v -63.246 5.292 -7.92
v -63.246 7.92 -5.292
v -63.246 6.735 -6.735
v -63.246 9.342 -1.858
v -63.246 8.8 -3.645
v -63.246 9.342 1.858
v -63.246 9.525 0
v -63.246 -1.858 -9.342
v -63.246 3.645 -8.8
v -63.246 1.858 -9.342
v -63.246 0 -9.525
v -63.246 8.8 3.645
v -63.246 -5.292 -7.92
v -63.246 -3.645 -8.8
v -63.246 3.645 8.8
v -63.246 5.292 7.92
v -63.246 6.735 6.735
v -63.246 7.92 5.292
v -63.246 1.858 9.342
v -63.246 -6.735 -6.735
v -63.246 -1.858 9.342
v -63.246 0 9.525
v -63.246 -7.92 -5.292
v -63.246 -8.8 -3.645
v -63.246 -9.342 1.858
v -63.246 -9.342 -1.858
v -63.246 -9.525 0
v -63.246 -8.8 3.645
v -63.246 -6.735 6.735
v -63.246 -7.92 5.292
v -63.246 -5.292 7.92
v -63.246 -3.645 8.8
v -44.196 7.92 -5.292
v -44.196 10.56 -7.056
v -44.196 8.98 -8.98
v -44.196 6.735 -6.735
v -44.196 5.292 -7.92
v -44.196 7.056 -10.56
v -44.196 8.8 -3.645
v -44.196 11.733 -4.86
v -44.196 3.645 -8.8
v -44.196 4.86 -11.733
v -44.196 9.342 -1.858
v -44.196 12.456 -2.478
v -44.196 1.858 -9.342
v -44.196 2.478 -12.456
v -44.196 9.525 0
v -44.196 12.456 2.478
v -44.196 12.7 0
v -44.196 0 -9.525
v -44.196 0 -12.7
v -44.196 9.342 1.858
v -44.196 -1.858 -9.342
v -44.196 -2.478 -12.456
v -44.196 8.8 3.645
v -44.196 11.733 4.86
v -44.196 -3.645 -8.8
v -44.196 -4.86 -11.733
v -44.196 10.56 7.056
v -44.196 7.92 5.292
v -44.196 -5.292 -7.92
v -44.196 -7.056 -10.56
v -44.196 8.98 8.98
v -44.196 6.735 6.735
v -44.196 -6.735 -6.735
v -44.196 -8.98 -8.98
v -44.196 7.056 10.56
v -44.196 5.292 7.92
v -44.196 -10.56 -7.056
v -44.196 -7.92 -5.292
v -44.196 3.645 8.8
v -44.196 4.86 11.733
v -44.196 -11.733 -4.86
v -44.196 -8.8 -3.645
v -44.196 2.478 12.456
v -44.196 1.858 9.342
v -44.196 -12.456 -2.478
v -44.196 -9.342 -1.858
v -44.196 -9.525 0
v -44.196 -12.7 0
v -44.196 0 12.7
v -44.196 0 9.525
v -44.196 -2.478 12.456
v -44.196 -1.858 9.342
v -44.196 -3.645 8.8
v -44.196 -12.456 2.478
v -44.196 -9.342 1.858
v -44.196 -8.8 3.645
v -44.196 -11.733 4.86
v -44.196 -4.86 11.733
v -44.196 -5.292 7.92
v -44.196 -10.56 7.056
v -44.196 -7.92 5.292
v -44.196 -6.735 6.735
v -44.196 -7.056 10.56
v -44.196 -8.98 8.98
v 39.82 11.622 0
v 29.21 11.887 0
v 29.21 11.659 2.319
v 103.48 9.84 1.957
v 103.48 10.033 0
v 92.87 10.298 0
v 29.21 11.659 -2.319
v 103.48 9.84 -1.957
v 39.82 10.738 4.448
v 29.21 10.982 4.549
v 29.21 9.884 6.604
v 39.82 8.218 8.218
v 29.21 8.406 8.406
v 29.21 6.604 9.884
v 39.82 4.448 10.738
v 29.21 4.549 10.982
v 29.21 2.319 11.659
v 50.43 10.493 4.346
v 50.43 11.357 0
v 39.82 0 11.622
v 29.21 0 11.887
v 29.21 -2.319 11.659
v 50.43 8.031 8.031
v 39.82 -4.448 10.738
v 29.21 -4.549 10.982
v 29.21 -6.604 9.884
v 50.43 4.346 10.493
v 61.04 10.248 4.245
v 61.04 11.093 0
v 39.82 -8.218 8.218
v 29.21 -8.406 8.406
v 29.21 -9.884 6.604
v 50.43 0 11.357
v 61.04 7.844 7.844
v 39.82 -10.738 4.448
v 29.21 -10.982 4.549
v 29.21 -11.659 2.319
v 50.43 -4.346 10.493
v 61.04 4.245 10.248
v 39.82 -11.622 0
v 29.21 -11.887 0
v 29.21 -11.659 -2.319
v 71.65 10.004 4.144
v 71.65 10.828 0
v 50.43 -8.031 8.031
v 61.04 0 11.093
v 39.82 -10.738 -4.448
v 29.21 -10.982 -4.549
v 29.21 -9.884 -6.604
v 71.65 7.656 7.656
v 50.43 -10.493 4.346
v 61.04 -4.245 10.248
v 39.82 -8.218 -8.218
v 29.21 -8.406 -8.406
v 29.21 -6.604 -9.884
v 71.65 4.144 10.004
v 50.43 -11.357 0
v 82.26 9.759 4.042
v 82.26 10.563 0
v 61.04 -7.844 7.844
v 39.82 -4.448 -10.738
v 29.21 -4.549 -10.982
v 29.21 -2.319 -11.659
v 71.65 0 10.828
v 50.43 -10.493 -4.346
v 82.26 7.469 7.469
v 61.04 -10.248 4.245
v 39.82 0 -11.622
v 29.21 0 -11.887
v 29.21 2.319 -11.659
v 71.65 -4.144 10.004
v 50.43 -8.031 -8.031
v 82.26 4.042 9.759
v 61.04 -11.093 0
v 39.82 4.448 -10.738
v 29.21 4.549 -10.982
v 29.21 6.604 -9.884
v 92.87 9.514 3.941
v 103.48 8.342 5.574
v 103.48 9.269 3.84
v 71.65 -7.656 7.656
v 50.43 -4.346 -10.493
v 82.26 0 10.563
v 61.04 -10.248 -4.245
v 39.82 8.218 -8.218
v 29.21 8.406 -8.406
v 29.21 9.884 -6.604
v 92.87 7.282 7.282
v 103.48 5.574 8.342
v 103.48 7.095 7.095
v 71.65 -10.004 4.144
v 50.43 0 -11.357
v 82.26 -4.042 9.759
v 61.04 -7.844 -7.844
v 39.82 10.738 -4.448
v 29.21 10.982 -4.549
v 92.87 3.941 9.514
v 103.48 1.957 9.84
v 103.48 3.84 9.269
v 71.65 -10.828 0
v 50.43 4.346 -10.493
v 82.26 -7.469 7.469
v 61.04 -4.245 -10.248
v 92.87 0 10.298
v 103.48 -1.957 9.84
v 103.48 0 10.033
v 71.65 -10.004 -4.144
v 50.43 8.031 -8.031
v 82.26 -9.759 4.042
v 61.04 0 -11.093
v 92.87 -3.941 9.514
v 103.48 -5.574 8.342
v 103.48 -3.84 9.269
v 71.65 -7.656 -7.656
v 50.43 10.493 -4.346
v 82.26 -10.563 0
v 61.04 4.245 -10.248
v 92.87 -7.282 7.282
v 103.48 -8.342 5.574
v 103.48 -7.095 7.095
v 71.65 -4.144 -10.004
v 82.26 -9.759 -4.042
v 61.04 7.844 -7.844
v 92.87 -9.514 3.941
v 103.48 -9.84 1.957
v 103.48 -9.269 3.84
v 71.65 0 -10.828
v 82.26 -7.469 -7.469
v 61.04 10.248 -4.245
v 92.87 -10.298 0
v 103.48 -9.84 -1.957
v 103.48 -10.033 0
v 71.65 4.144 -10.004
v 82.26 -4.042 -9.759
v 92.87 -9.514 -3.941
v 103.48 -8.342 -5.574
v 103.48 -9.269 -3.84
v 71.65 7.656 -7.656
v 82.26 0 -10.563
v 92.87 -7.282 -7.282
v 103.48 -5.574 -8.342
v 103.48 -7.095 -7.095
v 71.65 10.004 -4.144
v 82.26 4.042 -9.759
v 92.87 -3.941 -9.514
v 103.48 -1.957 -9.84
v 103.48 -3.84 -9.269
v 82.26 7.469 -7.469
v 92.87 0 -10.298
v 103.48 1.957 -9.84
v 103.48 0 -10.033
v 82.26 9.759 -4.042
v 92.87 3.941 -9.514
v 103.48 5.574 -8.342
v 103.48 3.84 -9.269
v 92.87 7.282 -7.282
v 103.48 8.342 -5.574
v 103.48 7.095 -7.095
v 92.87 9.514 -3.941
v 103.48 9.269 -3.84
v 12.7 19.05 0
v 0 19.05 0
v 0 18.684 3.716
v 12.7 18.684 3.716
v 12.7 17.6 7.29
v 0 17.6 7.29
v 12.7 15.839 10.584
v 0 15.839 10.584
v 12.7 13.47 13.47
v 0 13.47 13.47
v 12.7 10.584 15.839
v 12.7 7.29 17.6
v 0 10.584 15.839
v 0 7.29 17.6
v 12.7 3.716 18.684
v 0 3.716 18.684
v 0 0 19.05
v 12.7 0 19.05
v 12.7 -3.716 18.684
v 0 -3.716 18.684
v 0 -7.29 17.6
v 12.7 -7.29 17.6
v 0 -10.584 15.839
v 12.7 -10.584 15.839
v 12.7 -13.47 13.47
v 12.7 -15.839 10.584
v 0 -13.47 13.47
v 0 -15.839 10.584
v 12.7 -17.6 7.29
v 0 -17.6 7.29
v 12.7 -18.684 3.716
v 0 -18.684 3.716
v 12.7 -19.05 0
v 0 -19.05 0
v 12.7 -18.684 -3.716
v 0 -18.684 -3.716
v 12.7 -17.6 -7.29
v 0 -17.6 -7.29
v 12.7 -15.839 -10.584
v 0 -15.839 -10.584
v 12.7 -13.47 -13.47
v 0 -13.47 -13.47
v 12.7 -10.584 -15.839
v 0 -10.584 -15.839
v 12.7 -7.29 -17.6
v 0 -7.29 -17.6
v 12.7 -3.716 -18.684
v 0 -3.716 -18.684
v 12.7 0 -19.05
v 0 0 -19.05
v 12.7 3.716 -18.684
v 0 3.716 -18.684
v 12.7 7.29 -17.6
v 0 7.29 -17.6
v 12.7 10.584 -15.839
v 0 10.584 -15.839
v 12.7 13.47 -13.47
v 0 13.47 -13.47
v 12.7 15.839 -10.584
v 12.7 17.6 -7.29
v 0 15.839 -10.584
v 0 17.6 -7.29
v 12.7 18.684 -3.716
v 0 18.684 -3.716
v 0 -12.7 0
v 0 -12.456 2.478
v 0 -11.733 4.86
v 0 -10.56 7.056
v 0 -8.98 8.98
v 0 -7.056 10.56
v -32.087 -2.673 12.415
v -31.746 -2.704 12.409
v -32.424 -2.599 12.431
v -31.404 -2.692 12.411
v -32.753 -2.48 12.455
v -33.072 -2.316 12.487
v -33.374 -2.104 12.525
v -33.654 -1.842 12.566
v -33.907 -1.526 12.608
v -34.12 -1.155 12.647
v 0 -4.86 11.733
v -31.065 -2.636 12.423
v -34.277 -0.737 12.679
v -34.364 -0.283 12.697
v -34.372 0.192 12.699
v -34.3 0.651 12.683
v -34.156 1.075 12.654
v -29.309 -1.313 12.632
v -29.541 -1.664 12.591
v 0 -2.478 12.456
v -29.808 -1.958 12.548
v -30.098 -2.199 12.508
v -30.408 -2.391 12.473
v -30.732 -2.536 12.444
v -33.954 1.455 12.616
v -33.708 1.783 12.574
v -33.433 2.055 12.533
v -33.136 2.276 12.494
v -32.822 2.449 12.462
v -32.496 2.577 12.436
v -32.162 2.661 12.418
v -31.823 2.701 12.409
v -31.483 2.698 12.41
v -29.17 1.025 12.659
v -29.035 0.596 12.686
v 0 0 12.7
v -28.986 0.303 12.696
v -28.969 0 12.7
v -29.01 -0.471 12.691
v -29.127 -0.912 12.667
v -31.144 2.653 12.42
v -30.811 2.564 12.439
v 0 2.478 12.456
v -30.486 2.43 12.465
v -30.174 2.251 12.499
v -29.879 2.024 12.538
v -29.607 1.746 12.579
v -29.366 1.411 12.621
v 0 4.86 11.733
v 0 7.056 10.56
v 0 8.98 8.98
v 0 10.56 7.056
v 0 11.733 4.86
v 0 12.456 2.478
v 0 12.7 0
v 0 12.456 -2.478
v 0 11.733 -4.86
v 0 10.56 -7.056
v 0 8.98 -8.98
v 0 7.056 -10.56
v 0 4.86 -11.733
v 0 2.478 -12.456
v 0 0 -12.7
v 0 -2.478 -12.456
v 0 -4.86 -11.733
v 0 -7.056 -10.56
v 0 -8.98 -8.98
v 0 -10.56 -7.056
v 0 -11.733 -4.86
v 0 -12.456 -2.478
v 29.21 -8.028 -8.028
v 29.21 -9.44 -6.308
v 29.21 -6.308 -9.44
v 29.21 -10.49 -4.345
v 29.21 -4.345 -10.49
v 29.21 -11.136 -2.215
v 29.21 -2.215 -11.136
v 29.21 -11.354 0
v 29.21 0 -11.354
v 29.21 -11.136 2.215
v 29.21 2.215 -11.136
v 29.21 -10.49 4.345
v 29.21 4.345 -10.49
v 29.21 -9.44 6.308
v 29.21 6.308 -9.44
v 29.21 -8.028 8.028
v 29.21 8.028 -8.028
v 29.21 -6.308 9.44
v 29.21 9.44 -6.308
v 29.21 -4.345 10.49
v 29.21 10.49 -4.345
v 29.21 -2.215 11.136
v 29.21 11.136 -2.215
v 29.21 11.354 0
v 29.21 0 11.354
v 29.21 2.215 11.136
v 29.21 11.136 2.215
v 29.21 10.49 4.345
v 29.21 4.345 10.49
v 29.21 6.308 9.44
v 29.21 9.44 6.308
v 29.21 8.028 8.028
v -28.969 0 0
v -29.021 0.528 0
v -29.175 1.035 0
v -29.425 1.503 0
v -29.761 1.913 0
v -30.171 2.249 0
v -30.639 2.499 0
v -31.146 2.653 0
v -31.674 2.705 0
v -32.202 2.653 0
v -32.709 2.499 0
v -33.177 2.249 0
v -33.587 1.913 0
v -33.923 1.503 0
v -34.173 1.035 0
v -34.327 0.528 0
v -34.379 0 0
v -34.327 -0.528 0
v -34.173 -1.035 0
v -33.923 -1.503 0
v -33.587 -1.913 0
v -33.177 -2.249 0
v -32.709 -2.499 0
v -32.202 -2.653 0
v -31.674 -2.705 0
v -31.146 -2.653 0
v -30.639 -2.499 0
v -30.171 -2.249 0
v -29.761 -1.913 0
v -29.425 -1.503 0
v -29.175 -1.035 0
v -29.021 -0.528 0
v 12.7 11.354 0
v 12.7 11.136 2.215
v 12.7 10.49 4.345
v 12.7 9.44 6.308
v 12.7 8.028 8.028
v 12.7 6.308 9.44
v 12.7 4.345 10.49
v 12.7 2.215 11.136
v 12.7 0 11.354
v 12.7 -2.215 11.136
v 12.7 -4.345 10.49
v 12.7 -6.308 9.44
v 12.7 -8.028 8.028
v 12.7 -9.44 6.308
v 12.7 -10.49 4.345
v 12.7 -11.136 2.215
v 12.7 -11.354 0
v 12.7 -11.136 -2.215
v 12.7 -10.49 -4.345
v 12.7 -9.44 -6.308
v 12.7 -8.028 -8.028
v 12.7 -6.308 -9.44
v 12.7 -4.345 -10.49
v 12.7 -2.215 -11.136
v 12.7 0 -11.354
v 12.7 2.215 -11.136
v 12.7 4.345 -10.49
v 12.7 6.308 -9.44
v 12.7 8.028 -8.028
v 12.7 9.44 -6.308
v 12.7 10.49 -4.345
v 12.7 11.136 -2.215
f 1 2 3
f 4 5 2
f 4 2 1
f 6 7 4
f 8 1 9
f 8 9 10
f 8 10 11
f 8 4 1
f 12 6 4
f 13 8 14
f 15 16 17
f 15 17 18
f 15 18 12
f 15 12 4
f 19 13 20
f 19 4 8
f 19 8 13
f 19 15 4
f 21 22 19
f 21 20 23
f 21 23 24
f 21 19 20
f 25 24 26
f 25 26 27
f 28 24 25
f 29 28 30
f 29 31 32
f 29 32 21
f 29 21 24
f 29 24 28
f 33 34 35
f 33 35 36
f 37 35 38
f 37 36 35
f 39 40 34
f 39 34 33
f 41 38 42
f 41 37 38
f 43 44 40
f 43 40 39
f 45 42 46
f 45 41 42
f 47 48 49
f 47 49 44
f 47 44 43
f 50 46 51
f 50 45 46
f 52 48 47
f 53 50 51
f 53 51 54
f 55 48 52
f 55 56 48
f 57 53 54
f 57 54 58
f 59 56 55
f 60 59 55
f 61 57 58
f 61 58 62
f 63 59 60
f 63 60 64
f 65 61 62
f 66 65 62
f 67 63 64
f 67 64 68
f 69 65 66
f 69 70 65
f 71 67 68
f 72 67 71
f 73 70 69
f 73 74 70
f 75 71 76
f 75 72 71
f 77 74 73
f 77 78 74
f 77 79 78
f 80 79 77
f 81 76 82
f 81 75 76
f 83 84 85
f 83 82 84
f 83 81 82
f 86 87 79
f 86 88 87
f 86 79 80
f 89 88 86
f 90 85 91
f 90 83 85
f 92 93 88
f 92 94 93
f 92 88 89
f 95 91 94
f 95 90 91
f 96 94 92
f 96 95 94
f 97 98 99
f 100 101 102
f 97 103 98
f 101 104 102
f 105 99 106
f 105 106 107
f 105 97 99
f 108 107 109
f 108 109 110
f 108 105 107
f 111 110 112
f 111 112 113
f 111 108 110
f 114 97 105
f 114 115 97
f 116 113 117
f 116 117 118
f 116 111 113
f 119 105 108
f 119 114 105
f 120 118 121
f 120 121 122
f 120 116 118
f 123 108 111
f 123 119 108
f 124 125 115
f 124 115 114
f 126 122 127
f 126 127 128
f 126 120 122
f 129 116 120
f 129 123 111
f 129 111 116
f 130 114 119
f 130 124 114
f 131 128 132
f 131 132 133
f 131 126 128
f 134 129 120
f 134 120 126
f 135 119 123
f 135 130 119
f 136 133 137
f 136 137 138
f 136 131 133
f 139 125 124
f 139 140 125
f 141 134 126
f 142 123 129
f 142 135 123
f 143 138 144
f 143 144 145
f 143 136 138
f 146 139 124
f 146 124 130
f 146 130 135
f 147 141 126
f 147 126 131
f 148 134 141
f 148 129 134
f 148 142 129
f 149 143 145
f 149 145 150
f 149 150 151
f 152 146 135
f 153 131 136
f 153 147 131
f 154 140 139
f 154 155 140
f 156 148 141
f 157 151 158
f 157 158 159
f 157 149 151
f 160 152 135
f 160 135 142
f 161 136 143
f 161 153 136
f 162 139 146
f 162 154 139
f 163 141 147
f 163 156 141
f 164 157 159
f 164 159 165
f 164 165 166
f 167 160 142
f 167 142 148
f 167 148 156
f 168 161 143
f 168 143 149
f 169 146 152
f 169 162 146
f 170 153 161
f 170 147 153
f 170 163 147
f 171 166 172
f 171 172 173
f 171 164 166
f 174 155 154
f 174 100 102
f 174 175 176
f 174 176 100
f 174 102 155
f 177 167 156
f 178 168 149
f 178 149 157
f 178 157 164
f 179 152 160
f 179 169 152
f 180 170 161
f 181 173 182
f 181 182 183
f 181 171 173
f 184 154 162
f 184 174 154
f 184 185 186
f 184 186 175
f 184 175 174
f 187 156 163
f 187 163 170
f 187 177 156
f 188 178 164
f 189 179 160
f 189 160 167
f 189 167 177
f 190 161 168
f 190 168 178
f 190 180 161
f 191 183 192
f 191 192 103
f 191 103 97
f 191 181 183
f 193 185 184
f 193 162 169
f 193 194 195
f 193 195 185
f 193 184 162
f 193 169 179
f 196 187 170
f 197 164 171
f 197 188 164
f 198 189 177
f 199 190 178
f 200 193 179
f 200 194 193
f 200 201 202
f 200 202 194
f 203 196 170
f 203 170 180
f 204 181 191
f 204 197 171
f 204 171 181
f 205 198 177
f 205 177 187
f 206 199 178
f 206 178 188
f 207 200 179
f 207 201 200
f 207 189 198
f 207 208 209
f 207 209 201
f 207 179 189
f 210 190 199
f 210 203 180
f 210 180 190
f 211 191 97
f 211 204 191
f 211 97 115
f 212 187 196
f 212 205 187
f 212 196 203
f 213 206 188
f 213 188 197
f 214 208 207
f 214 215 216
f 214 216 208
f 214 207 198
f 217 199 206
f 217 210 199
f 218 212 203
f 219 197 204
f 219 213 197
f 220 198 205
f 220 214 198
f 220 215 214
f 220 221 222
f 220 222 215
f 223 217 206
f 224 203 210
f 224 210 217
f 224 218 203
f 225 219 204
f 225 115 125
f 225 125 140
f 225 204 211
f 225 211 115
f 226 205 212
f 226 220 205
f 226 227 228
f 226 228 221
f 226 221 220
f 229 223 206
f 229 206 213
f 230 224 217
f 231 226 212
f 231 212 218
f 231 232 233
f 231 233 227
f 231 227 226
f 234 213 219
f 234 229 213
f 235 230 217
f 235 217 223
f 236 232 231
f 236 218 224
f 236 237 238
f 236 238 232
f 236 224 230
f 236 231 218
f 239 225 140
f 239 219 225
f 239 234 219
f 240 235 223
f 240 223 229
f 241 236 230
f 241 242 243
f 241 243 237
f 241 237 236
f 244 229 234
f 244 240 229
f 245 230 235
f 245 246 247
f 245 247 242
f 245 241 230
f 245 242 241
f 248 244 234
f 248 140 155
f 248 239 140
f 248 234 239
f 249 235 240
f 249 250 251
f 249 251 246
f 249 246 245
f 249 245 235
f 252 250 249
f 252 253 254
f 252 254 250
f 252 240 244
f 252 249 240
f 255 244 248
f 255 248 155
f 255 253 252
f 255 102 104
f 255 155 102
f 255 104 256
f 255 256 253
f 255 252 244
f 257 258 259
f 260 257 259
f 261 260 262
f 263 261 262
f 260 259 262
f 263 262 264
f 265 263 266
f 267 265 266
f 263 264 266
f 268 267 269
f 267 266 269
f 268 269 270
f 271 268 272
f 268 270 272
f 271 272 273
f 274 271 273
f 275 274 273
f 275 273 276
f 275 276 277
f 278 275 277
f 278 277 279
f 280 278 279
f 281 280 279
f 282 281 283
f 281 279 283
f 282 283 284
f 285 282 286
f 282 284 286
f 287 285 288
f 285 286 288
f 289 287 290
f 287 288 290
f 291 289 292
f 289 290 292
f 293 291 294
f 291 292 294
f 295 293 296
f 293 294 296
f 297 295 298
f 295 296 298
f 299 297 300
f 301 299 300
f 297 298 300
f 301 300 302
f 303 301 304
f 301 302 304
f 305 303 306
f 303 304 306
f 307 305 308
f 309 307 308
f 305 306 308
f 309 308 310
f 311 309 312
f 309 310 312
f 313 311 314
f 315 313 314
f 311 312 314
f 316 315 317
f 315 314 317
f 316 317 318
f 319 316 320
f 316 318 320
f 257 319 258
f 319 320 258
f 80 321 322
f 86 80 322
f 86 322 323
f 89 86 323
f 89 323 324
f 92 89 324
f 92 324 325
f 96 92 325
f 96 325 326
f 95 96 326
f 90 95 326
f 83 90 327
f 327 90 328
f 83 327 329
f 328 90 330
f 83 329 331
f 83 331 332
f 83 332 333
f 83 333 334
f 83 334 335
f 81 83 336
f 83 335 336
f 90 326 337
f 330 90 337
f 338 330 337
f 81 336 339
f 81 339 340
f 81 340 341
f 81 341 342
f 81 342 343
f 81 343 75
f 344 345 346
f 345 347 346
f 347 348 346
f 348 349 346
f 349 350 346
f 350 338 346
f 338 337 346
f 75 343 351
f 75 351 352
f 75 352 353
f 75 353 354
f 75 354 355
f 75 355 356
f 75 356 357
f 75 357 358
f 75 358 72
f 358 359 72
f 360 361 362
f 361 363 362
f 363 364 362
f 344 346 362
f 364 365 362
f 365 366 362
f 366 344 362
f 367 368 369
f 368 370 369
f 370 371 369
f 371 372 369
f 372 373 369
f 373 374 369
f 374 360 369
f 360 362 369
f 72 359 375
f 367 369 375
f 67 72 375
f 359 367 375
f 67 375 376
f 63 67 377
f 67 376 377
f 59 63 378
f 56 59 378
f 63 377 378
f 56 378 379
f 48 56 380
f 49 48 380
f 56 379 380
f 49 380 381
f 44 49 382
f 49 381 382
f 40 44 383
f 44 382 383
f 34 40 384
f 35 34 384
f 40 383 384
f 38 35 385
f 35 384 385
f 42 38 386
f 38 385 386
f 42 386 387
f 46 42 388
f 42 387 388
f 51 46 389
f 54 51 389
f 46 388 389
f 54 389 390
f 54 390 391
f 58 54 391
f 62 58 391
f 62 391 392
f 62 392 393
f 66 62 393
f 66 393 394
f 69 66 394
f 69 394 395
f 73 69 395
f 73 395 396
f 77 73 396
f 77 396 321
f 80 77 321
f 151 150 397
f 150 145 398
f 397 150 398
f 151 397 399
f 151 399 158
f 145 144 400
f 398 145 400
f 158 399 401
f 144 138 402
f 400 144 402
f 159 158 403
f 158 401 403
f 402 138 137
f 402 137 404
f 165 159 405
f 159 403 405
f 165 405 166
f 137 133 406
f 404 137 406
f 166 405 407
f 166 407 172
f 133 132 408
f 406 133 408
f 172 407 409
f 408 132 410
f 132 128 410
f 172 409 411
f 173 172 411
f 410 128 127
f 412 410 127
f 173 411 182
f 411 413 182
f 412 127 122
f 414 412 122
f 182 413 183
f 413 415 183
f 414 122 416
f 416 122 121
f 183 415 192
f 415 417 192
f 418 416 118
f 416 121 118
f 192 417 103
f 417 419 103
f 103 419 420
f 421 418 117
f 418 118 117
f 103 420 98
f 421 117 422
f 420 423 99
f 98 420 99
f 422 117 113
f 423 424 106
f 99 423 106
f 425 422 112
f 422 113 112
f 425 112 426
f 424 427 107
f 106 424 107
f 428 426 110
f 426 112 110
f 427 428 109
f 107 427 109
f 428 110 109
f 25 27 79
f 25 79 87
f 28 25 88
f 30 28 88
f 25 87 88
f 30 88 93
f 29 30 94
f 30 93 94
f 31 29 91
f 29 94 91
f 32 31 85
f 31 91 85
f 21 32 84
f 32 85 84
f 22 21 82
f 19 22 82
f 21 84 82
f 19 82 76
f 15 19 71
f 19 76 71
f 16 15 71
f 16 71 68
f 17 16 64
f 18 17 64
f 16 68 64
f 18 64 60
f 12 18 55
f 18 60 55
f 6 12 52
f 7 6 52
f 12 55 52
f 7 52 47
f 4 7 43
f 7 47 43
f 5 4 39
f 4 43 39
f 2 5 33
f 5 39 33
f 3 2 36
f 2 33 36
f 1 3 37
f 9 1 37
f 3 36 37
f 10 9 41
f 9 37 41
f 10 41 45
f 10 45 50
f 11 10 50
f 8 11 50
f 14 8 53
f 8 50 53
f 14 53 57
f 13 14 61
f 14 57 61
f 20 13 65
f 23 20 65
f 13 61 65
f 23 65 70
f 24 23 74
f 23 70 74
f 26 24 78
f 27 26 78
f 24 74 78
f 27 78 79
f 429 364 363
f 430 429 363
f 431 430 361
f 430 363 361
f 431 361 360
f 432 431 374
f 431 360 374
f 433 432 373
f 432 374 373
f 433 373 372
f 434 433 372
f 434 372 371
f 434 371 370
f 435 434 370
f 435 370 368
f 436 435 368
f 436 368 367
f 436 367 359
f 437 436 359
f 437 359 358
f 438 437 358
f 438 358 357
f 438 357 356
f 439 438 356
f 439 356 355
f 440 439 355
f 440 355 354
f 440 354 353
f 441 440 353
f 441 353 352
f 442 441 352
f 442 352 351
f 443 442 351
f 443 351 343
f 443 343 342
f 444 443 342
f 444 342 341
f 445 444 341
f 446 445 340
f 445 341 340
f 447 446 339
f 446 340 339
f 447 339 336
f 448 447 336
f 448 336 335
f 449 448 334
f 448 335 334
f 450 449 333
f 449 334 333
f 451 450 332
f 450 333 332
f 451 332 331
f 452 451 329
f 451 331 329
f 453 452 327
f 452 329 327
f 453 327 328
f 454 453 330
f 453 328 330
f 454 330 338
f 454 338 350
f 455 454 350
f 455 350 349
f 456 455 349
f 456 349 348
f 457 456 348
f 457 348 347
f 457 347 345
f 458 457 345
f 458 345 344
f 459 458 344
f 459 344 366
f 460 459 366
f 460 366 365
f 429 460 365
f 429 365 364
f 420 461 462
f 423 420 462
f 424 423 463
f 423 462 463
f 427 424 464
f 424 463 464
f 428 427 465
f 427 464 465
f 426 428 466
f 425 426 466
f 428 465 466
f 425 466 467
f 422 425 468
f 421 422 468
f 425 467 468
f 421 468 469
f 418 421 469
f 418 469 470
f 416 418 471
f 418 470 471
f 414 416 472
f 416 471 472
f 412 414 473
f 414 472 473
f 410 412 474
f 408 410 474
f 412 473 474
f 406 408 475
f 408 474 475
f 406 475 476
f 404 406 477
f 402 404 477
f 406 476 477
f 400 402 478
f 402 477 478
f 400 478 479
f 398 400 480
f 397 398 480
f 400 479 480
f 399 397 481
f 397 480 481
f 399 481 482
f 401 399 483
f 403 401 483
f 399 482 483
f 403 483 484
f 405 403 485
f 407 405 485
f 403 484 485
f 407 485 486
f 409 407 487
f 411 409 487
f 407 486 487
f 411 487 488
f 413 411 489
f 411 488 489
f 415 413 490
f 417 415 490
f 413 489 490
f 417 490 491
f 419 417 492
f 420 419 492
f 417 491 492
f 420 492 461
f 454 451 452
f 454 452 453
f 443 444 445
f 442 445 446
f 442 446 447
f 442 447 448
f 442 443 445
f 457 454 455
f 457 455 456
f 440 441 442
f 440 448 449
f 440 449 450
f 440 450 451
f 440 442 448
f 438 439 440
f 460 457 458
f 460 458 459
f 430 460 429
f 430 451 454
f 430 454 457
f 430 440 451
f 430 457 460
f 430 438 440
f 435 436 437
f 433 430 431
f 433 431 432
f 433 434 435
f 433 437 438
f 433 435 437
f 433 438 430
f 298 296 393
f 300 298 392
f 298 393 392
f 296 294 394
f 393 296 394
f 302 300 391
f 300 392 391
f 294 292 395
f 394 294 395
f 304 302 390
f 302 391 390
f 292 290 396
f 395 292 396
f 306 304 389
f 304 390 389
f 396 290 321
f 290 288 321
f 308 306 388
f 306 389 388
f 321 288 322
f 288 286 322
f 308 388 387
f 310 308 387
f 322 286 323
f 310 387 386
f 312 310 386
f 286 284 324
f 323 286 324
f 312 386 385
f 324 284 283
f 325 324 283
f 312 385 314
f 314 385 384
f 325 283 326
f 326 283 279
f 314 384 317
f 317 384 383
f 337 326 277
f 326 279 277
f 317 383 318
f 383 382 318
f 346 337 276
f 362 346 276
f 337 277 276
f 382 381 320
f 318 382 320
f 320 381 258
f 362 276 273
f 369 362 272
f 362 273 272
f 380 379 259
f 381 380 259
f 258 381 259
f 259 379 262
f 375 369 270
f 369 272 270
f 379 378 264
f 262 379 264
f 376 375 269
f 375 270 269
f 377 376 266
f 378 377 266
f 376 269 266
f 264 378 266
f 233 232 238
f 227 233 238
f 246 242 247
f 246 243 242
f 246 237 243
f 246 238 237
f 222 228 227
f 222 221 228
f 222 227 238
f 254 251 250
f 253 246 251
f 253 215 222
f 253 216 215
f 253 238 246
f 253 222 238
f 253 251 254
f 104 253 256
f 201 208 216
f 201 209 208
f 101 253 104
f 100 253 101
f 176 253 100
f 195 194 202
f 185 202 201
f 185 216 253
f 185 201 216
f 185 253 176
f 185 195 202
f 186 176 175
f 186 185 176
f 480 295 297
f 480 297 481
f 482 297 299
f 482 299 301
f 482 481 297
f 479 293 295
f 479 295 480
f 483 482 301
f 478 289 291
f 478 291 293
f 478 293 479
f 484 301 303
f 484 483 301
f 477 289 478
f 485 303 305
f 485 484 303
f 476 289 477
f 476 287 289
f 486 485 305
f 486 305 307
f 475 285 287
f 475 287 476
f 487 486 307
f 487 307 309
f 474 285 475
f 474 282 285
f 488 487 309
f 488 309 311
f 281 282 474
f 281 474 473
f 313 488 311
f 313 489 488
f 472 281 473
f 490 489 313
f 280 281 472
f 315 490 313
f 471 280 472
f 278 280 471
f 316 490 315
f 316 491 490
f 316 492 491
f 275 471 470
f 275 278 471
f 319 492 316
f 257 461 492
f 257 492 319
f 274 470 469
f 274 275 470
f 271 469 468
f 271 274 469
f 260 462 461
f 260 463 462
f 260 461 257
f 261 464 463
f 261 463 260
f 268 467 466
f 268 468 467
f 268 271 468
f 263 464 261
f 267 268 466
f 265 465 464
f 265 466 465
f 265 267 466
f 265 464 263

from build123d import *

# Parameters (mm, degrees)
F0_R      = 19.05
F1_DEPTH  = 12.7
F2_R      = 12.7
F3_DEPTH  = 44.196
F4_R      = 9.525
F5_DEPTH  = 19.05
F6_R      = 11.3538
F7_DEPTH  = 16.51
F8_R      = 11.8872
F8_R_2    = 11.3538
F9_DEPTH  = 74.2696
F9_TAPER  = 1.43
F11_R     = 2.7051
F12_DEPTH = 12.7


with BuildPart() as f1:
    # F0 (on Right) → F1 (new body)
    with BuildSketch(Plane.YZ):
        Circle(F0_R)
    extrude(amount=F1_DEPTH)

    # F2 (on face) → F3 (join)
    with BuildSketch(Plane(origin=(0, 0, 0), x_dir=(0, -1, 0), z_dir=(-1, 0, 0))):
        Circle(F2_R)
    extrude(amount=F3_DEPTH)

    # F4 (on face) → F5 (join)
    with BuildSketch(Plane(origin=(-44.196, 0, 0), x_dir=(0, -1, 0), z_dir=(-1, 0, 0))):
        Circle(F4_R)
    extrude(amount=F5_DEPTH)

    # F6 (on face) → F7 (join)
    with BuildSketch(Plane.YZ.offset(12.7)):
        Circle(F6_R)
    extrude(amount=F7_DEPTH)

    # F8 (on face) → F9 (join)
    with BuildSketch(Plane.YZ.offset(29.21)):
        Circle(F8_R)
        Circle(F8_R_2, mode=Mode.SUBTRACT)
        Circle(F8_R_2)
    extrude(amount=F9_DEPTH, taper=F9_TAPER)

    # F11 (on offset) → F12 (cut)
    with BuildSketch(Plane.XY.offset(12.7)):
        with Locations((-31.6738, 0)):
            Circle(F11_R)
    extrude(amount=-F12_DEPTH, mode=Mode.SUBTRACT)


solid = f1.part
